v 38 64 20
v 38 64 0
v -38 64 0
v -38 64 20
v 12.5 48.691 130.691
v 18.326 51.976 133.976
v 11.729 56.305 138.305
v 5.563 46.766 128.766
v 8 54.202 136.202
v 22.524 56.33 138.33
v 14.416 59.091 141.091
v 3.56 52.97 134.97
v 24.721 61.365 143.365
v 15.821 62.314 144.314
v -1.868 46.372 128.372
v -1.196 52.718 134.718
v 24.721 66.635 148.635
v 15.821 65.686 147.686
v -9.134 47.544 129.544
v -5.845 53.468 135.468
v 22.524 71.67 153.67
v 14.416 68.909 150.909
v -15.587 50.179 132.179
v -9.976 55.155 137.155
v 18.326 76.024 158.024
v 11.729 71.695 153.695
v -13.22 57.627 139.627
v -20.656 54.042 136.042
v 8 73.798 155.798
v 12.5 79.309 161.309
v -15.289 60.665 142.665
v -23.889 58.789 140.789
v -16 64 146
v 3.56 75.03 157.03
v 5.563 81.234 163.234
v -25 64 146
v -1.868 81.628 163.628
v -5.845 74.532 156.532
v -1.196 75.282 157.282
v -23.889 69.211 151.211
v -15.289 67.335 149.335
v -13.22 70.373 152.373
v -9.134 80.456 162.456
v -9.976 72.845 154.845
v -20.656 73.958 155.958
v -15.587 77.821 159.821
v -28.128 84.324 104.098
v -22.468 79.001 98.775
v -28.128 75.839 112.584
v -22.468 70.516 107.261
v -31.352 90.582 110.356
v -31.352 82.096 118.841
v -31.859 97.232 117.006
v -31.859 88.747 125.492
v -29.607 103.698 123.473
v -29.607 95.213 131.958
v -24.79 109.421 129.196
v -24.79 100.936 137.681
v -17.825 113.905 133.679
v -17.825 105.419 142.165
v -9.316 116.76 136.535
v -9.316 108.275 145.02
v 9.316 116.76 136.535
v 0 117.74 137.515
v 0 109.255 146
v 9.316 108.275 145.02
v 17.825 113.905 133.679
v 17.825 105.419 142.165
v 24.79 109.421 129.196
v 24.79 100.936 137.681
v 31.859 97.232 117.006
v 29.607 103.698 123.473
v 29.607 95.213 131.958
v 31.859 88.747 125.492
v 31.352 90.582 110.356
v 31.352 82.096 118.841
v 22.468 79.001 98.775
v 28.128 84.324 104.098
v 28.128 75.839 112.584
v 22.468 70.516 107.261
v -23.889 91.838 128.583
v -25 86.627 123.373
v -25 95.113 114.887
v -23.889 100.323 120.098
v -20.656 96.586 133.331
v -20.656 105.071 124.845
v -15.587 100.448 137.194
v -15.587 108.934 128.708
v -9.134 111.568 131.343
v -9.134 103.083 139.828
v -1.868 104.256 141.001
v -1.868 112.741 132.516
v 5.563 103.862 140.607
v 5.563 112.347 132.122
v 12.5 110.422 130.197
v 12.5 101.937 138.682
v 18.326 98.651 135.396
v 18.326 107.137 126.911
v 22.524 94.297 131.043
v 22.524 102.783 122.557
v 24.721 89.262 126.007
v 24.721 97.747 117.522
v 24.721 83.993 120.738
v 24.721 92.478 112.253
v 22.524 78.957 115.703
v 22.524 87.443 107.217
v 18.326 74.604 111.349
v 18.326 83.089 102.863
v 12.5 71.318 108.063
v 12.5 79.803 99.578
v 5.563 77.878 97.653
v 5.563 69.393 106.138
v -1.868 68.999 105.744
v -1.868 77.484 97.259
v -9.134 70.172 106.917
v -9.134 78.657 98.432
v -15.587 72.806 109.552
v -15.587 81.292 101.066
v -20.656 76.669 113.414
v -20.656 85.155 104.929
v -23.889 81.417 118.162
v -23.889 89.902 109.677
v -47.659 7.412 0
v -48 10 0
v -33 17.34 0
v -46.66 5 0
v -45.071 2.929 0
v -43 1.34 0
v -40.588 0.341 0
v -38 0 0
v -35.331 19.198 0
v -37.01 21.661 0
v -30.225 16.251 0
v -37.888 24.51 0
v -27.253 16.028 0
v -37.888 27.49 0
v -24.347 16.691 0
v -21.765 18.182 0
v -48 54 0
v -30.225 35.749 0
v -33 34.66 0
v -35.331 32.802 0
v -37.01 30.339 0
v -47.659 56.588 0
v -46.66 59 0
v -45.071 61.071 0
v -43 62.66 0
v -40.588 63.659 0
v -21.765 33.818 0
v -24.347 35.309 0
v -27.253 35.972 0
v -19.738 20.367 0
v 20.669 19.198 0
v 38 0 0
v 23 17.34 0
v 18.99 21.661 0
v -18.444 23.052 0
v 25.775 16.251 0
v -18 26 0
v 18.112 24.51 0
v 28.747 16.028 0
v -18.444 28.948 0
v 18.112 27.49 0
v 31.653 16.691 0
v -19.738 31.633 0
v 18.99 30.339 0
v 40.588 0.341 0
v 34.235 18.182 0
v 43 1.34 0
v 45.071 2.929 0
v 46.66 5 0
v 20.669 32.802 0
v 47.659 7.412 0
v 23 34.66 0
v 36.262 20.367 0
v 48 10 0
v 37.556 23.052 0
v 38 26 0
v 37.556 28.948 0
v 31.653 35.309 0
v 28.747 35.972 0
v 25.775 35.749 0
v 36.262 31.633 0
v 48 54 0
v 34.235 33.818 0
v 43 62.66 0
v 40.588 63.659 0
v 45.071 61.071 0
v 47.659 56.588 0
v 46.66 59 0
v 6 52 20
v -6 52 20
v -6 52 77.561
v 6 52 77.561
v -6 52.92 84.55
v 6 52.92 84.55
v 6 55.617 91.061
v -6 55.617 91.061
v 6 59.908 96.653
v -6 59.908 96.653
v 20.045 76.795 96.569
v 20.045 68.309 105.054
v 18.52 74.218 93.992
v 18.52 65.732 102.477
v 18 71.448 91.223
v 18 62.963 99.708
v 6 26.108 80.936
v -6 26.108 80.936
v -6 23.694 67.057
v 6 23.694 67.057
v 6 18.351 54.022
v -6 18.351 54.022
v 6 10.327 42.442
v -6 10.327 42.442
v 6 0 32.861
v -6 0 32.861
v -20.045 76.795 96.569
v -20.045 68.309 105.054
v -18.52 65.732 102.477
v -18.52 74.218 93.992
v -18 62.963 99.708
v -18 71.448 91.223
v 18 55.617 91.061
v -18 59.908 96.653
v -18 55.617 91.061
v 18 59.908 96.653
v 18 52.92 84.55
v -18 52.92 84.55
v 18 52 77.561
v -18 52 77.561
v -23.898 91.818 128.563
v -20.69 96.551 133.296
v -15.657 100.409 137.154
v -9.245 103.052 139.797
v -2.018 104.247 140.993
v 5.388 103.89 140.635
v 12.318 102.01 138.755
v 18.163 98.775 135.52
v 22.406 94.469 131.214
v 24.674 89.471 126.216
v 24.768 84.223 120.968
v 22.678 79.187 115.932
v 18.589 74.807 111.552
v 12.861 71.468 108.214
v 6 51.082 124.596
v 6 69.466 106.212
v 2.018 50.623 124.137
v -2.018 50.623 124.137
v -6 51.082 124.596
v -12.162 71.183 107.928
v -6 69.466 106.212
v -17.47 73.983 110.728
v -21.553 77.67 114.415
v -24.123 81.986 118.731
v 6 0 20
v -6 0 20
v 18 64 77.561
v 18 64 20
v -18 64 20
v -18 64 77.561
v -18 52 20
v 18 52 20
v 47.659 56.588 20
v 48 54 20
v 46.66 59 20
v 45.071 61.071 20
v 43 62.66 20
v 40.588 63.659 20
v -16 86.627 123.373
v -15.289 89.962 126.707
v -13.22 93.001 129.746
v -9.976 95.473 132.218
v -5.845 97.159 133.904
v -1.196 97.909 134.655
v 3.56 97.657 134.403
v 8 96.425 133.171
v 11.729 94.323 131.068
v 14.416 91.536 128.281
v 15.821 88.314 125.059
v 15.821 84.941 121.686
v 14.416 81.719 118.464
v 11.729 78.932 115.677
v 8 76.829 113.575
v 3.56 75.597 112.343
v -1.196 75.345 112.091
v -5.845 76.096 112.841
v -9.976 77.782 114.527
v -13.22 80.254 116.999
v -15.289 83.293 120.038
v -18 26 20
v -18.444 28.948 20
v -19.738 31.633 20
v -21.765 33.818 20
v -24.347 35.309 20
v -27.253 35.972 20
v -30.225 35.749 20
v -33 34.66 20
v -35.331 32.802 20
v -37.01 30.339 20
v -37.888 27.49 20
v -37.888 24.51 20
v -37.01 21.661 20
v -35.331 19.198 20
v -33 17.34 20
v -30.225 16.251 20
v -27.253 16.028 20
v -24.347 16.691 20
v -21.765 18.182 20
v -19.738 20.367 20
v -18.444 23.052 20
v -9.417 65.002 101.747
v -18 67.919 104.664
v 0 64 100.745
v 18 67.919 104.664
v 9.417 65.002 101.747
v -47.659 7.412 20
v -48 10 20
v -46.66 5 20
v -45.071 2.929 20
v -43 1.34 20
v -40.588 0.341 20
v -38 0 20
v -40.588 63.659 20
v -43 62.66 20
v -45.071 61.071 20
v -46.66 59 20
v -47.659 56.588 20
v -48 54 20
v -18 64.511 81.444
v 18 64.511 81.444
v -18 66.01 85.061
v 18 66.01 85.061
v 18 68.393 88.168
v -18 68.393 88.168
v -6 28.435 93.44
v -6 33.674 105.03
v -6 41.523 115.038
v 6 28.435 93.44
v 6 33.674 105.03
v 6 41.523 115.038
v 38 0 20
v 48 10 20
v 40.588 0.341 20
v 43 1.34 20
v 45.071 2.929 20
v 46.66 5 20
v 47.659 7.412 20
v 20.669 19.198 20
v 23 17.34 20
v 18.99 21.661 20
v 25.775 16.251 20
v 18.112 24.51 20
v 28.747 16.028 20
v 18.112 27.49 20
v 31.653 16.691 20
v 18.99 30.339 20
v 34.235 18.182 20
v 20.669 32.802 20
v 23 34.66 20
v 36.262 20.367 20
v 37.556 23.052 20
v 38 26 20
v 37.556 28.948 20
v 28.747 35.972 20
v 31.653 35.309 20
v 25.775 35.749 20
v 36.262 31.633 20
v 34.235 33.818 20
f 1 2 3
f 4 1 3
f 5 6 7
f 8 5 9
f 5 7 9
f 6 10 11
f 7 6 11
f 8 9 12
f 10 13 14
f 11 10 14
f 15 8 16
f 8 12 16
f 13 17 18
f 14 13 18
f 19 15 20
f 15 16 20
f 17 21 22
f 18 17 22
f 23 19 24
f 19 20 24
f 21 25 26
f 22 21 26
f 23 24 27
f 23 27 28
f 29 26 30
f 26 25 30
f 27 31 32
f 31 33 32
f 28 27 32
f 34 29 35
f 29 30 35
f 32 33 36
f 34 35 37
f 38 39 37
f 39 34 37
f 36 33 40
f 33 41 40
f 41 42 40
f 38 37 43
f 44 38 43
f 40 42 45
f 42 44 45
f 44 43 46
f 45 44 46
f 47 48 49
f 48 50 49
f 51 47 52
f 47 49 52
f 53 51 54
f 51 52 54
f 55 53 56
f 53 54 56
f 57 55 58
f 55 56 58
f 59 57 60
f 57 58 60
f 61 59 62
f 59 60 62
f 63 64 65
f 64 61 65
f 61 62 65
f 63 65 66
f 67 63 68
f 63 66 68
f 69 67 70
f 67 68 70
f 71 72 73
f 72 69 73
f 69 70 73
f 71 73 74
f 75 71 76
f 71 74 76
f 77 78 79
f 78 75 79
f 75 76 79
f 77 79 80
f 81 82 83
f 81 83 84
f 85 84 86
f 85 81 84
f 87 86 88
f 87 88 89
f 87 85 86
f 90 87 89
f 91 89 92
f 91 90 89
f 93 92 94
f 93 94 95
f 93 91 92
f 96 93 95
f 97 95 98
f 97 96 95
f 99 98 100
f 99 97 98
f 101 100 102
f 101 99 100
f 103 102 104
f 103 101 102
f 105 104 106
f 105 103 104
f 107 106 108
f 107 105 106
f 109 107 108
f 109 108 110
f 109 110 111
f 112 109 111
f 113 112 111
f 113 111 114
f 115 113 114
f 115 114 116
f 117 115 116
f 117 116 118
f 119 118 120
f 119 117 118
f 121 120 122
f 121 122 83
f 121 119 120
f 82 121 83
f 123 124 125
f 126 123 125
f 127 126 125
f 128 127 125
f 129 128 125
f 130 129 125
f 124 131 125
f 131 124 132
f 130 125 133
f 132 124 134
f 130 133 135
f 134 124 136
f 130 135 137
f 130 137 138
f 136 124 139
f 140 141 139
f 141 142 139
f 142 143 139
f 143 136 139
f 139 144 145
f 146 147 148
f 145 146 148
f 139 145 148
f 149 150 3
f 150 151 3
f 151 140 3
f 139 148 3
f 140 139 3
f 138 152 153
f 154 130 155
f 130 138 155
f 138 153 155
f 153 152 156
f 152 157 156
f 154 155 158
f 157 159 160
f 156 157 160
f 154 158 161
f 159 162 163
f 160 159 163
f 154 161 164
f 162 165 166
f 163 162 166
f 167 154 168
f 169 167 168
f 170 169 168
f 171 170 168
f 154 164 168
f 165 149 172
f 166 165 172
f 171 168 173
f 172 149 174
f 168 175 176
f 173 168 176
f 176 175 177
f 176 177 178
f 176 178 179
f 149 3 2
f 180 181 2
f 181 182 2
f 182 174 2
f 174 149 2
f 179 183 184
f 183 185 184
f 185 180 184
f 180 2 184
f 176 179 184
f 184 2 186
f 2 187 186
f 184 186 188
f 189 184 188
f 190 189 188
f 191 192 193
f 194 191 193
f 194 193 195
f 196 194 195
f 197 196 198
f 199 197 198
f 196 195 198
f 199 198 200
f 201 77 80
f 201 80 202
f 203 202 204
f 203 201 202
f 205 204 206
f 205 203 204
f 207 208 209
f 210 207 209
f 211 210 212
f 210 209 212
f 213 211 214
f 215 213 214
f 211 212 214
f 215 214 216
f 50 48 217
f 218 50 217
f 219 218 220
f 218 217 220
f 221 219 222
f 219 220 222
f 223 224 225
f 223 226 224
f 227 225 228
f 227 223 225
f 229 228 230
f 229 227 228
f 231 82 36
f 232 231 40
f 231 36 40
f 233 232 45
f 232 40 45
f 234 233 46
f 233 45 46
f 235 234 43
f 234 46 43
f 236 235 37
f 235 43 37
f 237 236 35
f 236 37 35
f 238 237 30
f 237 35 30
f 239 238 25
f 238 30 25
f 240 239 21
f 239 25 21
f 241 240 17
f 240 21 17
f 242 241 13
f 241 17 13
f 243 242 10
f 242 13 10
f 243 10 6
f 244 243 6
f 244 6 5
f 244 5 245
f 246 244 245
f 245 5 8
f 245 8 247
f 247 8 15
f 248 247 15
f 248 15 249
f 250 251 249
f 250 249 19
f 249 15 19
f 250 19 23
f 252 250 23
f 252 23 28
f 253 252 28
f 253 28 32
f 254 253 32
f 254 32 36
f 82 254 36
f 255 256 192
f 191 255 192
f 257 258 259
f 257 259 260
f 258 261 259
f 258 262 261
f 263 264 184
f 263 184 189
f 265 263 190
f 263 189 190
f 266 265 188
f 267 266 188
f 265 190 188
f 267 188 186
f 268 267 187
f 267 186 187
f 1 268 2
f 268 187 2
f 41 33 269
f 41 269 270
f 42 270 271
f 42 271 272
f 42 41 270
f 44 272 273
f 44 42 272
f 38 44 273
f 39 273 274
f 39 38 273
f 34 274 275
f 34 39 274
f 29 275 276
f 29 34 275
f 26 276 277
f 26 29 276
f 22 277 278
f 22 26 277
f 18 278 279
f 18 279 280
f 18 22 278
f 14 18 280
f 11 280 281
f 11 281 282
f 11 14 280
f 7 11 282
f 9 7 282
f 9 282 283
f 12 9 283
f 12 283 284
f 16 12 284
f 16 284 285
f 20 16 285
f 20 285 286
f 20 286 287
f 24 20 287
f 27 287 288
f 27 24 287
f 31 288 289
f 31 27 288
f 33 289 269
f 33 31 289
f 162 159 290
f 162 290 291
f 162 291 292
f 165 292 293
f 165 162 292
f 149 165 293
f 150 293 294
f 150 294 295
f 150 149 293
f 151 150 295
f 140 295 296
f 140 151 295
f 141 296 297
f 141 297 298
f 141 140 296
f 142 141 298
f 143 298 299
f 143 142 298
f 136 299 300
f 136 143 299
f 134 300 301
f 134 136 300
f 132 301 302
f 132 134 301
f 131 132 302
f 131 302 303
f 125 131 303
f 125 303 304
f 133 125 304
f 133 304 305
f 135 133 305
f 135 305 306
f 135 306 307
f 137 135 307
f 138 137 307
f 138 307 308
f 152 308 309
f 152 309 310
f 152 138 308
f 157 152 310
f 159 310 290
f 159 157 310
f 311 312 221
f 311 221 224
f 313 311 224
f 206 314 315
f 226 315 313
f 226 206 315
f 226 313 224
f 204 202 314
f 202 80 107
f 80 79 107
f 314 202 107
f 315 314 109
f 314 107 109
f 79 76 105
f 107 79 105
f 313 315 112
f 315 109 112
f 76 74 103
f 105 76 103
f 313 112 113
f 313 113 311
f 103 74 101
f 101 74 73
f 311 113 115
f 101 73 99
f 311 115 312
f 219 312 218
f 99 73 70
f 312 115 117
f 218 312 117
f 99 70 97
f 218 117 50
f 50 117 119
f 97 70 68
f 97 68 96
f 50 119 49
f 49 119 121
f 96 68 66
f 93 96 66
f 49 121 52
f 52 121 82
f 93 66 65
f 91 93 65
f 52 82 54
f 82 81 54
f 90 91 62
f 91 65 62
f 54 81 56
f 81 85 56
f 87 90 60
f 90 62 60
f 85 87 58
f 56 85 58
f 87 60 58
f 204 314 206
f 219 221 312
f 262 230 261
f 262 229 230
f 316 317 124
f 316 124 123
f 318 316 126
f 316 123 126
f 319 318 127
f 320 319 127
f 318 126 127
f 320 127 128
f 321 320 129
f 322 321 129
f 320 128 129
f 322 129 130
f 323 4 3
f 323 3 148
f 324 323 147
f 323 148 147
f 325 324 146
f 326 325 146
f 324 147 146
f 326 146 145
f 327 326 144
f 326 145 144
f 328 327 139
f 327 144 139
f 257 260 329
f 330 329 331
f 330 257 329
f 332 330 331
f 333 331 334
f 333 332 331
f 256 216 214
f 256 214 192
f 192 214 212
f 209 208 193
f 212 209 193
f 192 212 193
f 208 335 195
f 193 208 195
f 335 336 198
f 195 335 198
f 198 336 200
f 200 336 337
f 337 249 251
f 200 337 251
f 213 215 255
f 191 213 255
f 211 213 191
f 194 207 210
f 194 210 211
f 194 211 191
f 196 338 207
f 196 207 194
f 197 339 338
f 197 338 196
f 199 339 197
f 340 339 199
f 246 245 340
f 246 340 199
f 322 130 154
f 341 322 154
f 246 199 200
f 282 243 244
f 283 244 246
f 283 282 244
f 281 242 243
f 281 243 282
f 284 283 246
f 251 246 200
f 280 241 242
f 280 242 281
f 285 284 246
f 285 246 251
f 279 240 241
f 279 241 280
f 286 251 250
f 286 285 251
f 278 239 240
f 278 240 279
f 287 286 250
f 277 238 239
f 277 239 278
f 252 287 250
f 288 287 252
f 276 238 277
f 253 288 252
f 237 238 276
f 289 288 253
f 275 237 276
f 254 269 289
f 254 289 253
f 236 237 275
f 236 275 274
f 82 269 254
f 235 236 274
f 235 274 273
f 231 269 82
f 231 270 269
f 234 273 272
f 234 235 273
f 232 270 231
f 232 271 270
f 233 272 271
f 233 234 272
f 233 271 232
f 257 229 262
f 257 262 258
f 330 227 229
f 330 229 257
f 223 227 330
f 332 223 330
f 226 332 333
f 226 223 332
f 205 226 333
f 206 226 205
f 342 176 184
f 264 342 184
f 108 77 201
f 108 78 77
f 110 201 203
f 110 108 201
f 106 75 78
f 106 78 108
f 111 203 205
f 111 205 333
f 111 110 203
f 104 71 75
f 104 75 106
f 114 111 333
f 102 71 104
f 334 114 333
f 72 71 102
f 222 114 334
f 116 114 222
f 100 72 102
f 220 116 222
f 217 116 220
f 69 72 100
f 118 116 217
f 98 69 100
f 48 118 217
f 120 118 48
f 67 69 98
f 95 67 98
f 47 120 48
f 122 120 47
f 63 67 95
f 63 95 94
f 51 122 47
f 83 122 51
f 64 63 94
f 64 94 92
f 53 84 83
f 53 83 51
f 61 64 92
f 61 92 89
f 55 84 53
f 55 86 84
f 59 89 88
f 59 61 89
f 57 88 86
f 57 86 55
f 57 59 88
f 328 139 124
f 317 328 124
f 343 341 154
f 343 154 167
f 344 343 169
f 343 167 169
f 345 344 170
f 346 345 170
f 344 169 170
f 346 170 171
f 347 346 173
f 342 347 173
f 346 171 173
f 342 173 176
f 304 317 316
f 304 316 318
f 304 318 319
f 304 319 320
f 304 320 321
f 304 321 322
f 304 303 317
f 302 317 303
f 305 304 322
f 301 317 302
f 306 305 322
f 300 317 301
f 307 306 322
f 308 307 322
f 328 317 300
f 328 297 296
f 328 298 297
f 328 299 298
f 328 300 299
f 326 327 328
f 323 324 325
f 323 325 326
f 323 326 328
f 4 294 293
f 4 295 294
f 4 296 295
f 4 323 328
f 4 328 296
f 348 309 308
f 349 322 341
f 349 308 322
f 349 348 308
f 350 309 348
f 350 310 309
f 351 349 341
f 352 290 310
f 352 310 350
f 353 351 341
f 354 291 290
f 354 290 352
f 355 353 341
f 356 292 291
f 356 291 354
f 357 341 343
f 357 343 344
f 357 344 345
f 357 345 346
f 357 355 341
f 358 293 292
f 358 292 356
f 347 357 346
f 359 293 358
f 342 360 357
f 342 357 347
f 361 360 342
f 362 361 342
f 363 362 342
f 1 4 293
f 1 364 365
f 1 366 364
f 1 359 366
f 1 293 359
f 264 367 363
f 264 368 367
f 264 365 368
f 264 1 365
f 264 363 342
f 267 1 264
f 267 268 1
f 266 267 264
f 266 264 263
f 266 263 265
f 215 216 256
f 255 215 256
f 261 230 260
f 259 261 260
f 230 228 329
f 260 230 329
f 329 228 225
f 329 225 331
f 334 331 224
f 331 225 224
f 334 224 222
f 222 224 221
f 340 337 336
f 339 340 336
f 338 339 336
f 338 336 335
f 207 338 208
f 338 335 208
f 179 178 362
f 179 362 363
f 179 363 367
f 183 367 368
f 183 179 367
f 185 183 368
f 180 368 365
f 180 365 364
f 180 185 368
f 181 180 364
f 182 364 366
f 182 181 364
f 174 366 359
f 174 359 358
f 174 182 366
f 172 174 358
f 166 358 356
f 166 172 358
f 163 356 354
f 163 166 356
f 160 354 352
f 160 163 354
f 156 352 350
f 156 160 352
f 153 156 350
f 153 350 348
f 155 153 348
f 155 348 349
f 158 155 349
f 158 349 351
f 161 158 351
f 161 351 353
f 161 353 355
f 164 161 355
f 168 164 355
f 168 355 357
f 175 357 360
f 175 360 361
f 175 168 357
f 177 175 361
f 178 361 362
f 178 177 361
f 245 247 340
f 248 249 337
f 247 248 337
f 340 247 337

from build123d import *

# Parameters (mm, degrees)
F0_R           = 10
F1_DEPTH       = 20
F4_R           = 25
F4_R_2         = 16
F5_DEPTH       = 32
F6_R           = 32
F6_R_2         = 25
F7_DEPTH       = 12
F9_DEPTH       = 18
F9_DEPTH_BACK  = 18
F11_T1_DEPTH   = 12
F13_DEPTH      = 6
F13_DEPTH_BACK = 6


# Not quite as in the source:
# - a fillet or chamfer that OpenCascade refuses, or shapes differently, is made with other operations: its cross-section is extruded or revolved along the edge and cut away or added
# - the program builds the solid bodies; features that only make, move or delete a surface that nothing else refers to are left out


with BuildPart() as f1:
    # F0 (on Top) → F1 (new body)
    with BuildSketch(Plane.XY):
        with BuildLine():
            ThreePointArc((-48, 10), (-45.0710678119, 2.9289321881), (-38, 0))
            Line((-38, 0), (38, 0))
            ThreePointArc((38, 0), (45.0710678119, 2.9289321881), (48, 10))
            Line((48, 10), (48, 54))
            ThreePointArc((48, 54), (45.0710678119, 61.0710678119), (38, 64))
            Line((38, 64), (-38, 64))
            ThreePointArc((-38, 64), (-45.0710678119, 61.0710678119), (-48, 54))
            Line((-48, 54), (-48, 10))
        make_face()
        with Locations((-28, 26)):
            Circle(F0_R, mode=Mode.SUBTRACT)
        with Locations((28, 26)):
            Circle(F0_R, mode=Mode.SUBTRACT)
    extrude(amount=F1_DEPTH)


with BuildPart() as f5:
    # F4 (on face) → F5 (new body)
    with BuildSketch(Plane(origin=(0, -41, 41), x_dir=(-1, 0, 0), z_dir=(0, 0.7071067812, -0.7071067812))):
        with Locations((0, 148.4924240492)):
            Circle(F4_R)
        with Locations((0, 148.4924240492)):
            Circle(F4_R_2, mode=Mode.SUBTRACT)
    extrude(amount=F5_DEPTH)

    # F12 (on Right) → F13 (join, two sides)
    with BuildSketch(Plane.YZ) as f13_sk:
        with BuildLine():
            Line((52.0598683189, 125.5745869447), (41.5233405971, 115.0380592229))
            ThreePointArc((41.5233405971, 115.0380592229), (30.7052427168, 99.392946237), (26.1075371191, 80.9359176211))
            ThreePointArc((26.1075371191, 80.9359176211), (18.3506426226, 54.0218220938), (0, 32.8607288891))
            Line((0, 32.8607288891), (0, 20))
            Line((0, 20), (10, 20))
            Line((10, 20), (52, 20))
            Line((52, 20), (52, 77.56139982))
            ThreePointArc((52, 77.56139982), (54.0552526222, 87.8938524938), (59.908116908, 96.653282912))
            Line((59.908116908, 96.653282912), (62.9630978656, 99.7082638696))
            Line((62.9630978656, 99.7082638696), (70.5155401419, 107.2607061459))
            Line((70.5155401419, 107.2607061459), (52.0598683189, 125.5745869447))
        make_face()
    extrude(amount=F13_DEPTH)
    extrude(f13_sk.sketch, amount=-F13_DEPTH_BACK)


with BuildPart() as f7:
    # F6 (on face) → F7 (new body)
    with BuildSketch(Plane(origin=(0, -18.372583002, 18.372583002), x_dir=(-1, 0, 0), z_dir=(0, 0.7071067812, -0.7071067812))):
        with Locations((0, 148.4924240492)):
            Circle(F6_R)
        with Locations((0, 148.4924240492)):
            Circle(F6_R_2, mode=Mode.SUBTRACT)
    extrude(amount=F7_DEPTH)

    # F8 (on Right) → F9 (join, two sides)
    with BuildSketch(Plane.YZ) as f9_sk:
        with BuildLine():
            Line((52, 20), (64, 20))
            Line((64, 20), (64, 77.56139982))
            ThreePointArc((64, 77.56139982), (65.1418070123, 83.3016513055), (68.3933982822, 88.1680015378))
            Line((68.3933982822, 88.1680015378), (76.4746504982, 96.2492537538))
            Line((76.4746504982, 96.2492537538), (67.989369124, 104.7345351281))
            Line((67.989369124, 104.7345351281), (59.908116908, 96.653282912))
            ThreePointArc((59.908116908, 96.653282912), (54.0552526222, 87.8938524938), (52, 77.56139982))
            Line((52, 77.56139982), (52, 20))
        make_face()
    extrude(amount=F9_DEPTH)
    extrude(f9_sk.sketch, amount=-F9_DEPTH_BACK)

    # F10: union 

    # F11: fillet of radius 15 on 2 edges, made by hand

    # F11_s2 → F11_t1 (join)
    with BuildSketch(Plane(origin=(0, -9.8873016278, 9.8873016278), x_dir=(1, 0, 0), z_dir=(0, -0.7071067812, 0.7071067812))):
        with BuildLine():
            ThreePointArc((22.4680851064, 125.706789284), (19.1620318796, 120.8148603752), (18, 115.0260229878))
            Line((18, 115.0260229878), (18, 122.0349109385))
            ThreePointArc((18, 122.0349109385), (20.3171639431, 123.7697047548), (22.4680851064, 125.706789284))
        make_face()
        with BuildLine():
            ThreePointArc((-22.4680851064, 125.706789284), (-19.1620318796, 120.8148603752), (-18, 115.0260229878))
            Line((-18, 115.0260229878), (-18, 122.0349109385))
            ThreePointArc((-18, 122.0349109385), (-20.3171639431, 123.7697047548), (-22.4680851064, 125.706789284))
        make_face()
    extrude(amount=F11_T1_DEPTH)


solid = Compound([f1.part, f5.part, f7.part])
